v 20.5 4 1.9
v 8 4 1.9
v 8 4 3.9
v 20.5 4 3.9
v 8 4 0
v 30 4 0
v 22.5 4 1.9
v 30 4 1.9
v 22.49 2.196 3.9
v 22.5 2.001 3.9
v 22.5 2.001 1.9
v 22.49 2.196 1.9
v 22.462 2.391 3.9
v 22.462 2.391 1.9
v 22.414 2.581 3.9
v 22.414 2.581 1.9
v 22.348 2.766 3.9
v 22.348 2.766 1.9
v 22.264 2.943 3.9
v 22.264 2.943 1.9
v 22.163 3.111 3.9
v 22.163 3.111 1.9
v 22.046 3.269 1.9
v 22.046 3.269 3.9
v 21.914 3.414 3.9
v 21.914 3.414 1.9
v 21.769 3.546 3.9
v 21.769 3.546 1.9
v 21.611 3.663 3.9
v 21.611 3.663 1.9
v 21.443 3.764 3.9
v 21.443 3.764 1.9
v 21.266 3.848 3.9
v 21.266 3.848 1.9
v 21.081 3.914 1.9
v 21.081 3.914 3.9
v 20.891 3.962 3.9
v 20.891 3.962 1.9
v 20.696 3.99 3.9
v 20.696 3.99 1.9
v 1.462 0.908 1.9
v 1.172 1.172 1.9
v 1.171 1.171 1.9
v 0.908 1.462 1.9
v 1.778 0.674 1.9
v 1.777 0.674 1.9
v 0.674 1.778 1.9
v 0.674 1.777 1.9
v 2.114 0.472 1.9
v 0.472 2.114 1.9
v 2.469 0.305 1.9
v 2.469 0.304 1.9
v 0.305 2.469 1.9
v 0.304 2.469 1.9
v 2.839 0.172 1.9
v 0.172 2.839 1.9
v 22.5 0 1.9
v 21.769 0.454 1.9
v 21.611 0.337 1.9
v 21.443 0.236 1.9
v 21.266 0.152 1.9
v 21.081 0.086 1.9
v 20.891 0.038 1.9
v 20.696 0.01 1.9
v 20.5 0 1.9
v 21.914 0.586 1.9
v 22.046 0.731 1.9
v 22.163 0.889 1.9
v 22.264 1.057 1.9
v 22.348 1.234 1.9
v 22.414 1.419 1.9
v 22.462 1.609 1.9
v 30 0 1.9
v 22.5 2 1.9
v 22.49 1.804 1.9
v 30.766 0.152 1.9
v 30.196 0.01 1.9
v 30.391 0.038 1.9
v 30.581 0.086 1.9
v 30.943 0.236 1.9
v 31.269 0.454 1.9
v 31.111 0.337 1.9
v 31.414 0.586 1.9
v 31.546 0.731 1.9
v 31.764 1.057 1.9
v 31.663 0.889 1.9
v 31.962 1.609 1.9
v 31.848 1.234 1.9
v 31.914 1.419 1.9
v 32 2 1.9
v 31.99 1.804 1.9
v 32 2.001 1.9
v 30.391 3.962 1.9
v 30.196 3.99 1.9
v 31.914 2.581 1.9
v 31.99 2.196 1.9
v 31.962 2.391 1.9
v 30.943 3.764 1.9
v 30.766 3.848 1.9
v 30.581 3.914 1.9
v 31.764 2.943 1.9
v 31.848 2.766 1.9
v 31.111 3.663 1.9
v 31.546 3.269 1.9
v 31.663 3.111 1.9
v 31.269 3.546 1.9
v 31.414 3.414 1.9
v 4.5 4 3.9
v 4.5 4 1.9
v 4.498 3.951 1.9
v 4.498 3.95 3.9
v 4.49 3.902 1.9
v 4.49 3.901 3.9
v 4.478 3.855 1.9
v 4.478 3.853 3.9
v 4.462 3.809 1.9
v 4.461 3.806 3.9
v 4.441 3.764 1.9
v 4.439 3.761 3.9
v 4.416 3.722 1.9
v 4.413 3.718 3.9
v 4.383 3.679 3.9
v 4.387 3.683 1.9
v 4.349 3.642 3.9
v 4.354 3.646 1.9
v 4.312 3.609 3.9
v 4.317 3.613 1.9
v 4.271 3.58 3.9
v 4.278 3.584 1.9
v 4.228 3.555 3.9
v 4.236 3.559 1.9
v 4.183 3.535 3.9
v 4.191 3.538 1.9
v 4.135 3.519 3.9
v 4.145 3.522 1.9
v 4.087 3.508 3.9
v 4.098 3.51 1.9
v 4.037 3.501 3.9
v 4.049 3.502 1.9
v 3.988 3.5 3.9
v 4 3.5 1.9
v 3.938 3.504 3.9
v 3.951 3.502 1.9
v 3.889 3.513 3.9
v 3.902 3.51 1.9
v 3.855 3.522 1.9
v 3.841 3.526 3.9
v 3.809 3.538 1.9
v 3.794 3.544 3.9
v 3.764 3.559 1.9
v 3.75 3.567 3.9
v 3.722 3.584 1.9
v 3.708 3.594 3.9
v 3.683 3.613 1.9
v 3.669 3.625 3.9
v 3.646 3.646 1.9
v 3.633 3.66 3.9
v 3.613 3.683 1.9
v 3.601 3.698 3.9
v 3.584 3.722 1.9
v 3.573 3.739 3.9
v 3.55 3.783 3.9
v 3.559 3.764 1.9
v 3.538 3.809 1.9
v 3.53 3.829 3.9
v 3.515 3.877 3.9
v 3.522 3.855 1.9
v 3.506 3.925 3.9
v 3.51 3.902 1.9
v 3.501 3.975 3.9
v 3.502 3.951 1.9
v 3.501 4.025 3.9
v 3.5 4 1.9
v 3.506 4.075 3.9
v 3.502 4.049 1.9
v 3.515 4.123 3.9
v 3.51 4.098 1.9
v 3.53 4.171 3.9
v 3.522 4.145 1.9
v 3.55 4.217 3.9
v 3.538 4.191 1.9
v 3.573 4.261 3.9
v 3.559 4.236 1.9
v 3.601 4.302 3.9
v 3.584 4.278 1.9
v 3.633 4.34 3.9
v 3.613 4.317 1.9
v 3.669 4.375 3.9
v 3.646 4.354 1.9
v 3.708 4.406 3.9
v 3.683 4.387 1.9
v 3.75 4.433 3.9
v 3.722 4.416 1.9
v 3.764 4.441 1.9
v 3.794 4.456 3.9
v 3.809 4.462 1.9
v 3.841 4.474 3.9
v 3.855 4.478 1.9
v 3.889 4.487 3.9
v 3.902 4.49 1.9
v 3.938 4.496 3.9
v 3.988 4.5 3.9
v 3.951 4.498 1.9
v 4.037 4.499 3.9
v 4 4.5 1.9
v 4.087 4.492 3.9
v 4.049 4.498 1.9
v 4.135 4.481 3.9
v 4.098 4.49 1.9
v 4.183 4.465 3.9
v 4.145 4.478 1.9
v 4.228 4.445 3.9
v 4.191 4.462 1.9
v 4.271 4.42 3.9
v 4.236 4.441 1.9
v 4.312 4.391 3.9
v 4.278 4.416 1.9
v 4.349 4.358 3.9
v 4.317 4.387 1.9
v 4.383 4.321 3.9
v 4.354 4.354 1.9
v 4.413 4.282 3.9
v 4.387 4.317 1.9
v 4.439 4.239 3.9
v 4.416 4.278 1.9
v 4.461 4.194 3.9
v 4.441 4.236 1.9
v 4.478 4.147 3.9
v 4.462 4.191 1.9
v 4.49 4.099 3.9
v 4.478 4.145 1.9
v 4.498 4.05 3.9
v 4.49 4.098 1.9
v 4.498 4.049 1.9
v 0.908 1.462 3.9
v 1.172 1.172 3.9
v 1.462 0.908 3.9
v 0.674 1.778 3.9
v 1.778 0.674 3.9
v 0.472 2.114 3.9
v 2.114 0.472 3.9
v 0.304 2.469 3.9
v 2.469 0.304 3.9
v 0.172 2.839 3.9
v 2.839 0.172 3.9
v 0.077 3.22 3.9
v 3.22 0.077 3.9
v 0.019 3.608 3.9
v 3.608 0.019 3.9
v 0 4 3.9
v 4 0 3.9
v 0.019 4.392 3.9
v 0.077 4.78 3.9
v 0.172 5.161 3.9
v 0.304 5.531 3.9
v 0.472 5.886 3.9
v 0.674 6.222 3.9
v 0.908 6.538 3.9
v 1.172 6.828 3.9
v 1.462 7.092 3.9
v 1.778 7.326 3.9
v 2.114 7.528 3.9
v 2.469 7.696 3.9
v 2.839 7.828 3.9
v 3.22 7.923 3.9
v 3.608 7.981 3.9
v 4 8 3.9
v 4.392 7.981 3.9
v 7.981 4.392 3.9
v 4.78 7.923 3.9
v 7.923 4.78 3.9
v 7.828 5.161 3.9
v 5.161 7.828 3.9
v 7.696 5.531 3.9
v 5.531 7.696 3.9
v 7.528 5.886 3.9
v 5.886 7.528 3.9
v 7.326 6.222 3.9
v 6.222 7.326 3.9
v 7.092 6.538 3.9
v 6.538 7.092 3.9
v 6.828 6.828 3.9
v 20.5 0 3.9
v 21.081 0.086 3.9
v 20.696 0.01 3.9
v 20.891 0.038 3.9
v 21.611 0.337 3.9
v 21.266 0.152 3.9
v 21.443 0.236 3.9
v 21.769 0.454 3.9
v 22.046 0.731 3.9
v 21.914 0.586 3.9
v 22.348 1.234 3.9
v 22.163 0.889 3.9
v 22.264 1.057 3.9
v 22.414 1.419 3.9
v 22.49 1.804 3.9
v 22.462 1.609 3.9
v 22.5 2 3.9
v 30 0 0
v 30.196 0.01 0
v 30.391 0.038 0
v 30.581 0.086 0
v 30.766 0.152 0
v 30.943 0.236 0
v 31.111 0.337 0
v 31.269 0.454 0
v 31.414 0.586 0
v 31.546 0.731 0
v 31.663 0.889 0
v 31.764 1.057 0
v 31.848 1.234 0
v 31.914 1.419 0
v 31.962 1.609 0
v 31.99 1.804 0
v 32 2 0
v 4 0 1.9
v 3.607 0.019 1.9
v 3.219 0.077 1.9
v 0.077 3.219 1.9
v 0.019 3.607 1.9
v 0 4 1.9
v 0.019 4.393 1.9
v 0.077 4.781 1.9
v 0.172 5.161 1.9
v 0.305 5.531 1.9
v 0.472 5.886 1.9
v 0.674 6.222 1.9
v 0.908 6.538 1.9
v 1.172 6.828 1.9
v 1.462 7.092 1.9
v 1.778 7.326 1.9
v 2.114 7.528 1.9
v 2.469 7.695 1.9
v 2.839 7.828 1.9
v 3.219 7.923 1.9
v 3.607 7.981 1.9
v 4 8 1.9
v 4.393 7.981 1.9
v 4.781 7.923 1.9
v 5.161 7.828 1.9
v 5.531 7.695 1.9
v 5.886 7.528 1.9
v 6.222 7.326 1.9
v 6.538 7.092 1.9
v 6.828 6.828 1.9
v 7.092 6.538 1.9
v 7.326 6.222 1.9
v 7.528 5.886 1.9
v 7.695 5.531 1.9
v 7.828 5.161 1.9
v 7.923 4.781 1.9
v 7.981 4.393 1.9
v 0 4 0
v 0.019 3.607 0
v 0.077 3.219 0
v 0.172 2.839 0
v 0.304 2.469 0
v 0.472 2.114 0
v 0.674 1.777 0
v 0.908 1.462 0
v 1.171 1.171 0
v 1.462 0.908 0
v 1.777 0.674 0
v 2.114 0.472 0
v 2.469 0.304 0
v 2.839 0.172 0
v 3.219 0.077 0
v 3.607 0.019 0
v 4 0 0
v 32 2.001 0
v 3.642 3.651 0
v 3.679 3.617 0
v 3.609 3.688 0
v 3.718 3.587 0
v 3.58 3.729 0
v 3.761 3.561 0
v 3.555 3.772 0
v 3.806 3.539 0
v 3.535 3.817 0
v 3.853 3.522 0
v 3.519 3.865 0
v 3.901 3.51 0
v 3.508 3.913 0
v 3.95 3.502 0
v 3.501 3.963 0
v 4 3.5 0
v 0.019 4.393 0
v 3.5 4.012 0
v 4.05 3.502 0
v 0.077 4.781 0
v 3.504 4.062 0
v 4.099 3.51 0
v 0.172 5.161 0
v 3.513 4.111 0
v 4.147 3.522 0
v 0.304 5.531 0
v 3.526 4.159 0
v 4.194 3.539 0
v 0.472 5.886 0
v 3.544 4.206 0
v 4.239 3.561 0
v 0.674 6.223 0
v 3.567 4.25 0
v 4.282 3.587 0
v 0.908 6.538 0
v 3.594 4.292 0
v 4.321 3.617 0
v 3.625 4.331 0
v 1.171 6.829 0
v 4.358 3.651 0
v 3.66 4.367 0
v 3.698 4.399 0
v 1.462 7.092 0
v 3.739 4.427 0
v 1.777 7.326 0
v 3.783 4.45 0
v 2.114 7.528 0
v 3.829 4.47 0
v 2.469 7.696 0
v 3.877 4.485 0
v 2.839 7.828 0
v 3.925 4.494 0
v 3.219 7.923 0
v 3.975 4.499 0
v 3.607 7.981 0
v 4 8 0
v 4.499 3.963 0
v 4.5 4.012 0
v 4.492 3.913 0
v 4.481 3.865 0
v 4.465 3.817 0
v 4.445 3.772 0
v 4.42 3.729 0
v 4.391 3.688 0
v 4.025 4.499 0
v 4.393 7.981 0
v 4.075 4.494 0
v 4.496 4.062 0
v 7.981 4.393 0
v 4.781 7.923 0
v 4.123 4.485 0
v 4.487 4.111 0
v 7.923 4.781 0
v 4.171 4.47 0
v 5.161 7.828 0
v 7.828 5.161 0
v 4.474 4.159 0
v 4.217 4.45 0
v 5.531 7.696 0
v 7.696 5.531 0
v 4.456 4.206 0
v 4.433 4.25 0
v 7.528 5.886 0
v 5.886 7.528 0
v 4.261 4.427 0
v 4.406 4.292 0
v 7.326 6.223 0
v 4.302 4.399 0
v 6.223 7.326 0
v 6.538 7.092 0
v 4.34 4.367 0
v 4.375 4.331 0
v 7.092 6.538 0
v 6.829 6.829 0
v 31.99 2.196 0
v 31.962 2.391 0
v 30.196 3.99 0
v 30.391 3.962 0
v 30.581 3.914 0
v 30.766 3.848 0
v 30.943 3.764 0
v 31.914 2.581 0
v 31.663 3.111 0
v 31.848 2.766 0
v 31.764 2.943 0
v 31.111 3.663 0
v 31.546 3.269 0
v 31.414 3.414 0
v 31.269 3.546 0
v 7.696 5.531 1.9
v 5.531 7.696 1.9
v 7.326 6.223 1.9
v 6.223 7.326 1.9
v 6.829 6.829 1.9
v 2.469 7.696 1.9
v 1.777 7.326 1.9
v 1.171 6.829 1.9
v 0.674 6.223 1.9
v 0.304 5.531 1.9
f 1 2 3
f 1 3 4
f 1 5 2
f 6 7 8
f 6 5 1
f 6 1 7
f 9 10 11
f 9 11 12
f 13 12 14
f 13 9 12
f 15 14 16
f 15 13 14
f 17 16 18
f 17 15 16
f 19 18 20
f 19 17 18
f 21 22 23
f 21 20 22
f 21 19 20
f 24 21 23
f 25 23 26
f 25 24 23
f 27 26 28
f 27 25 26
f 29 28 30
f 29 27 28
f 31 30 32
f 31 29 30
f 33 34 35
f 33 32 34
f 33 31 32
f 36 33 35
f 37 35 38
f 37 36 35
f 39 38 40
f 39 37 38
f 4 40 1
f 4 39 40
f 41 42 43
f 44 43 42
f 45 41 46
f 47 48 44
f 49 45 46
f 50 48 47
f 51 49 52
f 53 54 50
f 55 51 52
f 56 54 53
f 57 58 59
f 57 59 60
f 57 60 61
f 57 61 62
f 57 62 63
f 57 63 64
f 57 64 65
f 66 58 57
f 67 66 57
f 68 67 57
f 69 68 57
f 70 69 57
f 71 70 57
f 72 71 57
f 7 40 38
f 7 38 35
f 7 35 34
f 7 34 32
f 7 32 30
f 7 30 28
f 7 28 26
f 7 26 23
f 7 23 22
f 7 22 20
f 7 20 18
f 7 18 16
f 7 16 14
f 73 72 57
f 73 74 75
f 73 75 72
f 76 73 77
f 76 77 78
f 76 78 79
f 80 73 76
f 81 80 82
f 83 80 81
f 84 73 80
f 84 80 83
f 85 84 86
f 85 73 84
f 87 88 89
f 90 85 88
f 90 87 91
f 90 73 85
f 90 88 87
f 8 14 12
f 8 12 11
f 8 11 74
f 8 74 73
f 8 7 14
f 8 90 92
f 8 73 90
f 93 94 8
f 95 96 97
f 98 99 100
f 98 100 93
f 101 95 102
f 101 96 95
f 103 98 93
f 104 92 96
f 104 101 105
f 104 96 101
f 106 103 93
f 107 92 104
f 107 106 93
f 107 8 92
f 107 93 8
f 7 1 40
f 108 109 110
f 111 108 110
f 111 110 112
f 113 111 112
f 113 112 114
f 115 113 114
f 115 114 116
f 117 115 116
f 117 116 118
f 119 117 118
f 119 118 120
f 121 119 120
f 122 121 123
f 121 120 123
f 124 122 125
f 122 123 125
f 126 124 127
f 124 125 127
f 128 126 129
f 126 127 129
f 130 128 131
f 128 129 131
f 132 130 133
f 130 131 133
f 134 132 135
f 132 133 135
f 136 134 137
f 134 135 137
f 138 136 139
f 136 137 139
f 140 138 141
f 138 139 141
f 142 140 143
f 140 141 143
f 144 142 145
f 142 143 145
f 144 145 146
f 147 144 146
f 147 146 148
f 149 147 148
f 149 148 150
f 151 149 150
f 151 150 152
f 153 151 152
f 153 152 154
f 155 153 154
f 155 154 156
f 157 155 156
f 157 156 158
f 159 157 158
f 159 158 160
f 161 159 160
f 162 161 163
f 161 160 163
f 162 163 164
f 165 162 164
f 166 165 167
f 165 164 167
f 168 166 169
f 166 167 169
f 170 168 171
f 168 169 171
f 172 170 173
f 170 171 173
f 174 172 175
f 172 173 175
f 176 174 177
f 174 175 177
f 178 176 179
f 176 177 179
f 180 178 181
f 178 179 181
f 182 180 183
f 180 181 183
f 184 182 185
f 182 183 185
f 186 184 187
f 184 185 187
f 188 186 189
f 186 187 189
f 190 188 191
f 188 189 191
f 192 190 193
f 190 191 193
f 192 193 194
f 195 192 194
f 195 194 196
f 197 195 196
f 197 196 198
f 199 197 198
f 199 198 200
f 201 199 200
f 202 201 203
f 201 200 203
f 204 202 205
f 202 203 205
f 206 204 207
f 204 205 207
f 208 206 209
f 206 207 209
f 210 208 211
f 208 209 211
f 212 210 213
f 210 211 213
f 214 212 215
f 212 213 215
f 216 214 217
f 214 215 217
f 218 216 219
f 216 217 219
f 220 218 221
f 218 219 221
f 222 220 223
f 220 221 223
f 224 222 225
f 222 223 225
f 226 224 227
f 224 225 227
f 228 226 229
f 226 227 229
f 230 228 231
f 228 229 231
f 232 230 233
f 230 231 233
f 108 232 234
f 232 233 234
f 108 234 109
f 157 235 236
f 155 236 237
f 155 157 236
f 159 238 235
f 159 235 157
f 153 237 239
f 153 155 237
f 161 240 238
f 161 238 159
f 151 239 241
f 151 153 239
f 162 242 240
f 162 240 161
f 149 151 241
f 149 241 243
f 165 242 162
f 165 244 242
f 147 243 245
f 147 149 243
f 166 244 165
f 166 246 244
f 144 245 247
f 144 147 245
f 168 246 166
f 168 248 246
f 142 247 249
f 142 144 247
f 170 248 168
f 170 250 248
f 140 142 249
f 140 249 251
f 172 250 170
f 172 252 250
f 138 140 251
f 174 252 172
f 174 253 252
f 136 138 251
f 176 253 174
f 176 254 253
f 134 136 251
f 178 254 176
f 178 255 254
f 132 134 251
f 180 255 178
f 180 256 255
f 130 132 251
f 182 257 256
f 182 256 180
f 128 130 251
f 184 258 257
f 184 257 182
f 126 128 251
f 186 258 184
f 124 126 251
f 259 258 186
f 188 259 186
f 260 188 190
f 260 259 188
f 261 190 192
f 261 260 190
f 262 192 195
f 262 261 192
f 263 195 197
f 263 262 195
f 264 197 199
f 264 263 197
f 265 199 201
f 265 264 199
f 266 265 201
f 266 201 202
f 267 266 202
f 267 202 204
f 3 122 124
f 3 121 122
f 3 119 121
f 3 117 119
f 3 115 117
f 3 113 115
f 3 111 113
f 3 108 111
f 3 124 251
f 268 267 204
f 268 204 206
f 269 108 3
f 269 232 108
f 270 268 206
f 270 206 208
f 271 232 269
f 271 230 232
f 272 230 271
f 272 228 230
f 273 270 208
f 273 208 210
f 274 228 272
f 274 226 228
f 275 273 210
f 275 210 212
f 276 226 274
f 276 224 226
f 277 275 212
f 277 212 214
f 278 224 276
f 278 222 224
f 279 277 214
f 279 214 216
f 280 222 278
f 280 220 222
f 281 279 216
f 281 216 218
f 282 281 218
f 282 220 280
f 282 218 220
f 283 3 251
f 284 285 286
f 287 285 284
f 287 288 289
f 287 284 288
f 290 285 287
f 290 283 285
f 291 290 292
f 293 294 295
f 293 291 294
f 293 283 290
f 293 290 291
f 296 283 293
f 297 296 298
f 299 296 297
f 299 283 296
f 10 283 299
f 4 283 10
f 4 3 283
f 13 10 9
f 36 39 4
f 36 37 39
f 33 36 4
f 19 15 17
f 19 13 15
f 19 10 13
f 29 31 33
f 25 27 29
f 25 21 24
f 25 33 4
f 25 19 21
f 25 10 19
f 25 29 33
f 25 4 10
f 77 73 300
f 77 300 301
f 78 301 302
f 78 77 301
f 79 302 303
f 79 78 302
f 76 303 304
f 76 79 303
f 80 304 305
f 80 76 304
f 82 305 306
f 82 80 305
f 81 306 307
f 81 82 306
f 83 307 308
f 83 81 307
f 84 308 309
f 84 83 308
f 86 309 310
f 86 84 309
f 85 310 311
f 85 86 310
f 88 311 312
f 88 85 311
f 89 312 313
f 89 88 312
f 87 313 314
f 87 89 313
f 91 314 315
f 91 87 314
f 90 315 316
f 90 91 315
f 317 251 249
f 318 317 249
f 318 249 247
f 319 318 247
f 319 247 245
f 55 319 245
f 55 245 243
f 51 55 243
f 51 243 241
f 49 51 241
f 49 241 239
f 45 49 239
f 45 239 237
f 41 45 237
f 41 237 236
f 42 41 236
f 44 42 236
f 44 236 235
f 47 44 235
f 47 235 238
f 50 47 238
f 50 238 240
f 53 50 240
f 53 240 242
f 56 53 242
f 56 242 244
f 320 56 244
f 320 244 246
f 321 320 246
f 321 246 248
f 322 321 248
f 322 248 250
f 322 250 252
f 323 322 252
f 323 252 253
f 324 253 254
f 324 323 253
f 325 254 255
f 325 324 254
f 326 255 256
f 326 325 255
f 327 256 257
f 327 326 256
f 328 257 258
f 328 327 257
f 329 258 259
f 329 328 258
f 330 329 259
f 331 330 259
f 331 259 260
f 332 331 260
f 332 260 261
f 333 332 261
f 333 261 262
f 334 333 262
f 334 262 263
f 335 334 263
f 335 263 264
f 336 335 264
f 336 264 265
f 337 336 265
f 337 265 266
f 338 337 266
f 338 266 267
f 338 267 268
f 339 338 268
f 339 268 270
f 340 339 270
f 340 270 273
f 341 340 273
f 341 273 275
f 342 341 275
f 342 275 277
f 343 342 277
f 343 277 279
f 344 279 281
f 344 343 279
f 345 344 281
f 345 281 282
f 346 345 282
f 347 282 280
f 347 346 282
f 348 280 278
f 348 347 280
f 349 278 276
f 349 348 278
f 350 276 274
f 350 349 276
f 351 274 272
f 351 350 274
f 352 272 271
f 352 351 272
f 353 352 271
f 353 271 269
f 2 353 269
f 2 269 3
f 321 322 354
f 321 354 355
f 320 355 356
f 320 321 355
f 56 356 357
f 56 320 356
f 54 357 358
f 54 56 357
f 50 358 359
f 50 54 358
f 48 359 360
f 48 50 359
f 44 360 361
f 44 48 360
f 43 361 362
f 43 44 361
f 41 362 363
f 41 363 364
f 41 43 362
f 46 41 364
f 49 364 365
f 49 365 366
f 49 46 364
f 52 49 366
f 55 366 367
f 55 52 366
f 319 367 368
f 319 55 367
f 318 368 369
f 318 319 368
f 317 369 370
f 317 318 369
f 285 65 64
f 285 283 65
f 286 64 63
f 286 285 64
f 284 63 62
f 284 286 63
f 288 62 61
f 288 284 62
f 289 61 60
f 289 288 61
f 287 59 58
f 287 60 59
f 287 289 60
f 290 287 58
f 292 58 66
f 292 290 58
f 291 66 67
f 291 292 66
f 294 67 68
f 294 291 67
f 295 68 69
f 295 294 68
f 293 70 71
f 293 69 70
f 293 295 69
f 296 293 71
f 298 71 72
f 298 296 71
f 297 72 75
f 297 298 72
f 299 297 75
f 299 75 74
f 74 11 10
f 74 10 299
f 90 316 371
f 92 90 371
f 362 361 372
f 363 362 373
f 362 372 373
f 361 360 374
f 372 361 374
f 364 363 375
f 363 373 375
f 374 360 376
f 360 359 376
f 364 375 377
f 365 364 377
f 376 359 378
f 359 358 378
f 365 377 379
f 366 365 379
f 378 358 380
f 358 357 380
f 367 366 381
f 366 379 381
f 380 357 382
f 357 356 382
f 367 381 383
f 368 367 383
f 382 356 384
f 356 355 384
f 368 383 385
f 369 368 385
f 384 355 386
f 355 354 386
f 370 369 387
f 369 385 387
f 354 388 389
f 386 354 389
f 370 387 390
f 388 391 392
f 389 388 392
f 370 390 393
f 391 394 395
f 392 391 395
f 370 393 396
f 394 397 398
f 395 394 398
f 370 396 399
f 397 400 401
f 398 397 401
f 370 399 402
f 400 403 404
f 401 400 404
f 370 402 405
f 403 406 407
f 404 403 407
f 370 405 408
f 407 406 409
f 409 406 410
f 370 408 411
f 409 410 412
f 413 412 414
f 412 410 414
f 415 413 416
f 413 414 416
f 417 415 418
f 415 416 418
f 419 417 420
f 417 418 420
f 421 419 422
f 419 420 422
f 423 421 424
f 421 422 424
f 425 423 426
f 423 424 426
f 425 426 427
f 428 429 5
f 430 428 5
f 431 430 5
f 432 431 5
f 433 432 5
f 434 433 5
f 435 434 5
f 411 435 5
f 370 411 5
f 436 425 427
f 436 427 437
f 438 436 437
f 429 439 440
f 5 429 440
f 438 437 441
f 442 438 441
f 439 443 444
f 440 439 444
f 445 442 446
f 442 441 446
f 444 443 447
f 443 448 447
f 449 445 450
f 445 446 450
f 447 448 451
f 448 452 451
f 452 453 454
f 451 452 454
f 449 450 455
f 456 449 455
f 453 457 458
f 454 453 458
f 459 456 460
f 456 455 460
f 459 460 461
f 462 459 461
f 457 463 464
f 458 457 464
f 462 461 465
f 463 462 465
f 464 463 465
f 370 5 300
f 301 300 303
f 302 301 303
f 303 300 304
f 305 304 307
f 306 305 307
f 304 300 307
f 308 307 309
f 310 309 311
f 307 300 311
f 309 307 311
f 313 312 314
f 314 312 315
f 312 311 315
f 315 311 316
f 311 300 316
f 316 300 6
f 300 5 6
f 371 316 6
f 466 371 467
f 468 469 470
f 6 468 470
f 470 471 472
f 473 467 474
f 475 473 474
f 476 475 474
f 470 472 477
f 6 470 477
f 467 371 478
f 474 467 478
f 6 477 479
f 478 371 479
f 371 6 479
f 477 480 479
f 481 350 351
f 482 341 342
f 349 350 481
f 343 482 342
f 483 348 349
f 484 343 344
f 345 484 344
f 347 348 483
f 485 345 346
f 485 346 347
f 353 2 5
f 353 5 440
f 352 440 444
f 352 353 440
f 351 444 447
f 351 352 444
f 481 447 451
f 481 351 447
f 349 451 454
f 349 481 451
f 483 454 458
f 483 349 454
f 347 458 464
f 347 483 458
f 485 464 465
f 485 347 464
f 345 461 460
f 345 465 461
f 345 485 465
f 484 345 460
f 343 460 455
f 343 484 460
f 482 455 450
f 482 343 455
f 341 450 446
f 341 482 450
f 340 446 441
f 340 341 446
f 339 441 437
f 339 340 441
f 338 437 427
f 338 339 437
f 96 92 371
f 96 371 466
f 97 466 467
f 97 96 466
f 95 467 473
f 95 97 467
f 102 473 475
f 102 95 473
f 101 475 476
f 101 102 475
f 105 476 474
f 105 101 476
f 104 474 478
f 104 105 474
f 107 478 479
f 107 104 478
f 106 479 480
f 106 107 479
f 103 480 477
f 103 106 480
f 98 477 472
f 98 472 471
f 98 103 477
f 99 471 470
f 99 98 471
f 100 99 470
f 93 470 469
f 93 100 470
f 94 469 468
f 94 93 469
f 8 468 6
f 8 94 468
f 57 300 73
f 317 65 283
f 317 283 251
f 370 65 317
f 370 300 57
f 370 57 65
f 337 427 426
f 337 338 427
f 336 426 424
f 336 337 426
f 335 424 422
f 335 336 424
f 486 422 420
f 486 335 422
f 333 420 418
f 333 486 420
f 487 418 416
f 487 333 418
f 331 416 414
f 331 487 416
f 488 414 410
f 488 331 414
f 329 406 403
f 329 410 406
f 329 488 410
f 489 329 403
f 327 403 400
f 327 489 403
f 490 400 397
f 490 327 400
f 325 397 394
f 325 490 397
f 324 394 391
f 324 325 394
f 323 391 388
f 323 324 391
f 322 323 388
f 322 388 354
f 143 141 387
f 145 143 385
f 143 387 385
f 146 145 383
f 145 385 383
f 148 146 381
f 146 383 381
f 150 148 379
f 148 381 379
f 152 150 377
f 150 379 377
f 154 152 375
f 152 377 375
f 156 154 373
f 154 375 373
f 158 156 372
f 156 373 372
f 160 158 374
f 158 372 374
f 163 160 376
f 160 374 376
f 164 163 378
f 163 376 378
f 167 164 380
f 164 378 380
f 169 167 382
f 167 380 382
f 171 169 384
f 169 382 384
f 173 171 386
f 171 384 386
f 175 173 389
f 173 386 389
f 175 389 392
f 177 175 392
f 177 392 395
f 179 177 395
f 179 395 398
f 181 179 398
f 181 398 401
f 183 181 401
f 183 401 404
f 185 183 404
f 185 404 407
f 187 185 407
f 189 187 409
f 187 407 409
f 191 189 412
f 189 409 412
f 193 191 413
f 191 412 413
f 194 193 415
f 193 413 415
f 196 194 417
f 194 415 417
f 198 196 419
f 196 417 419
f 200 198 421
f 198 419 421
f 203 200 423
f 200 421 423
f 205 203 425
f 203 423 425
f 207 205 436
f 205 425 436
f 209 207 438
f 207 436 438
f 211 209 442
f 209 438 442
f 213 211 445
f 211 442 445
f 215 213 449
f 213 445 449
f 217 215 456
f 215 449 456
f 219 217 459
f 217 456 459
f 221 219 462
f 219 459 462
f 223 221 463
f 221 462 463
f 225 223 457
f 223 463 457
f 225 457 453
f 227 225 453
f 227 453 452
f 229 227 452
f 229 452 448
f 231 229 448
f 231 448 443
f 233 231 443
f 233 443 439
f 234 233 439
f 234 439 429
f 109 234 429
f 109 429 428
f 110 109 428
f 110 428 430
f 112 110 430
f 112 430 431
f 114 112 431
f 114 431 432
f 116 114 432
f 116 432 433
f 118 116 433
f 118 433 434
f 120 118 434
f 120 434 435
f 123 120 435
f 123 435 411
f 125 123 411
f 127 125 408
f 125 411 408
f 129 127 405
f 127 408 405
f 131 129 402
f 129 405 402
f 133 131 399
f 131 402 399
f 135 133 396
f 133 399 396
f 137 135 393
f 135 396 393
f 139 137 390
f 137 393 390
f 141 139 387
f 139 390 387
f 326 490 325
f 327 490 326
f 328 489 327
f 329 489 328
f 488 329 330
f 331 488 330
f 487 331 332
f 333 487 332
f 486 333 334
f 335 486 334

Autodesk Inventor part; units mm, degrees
ref_plane "YZ Plane" through (0, 0, 0) normal (1, 0, 0) x (0, 1, 0)
ref_plane "XZ Plane" through (0, 0, 0) normal (0, 1, 0) x (-1, 0, 0)
ref_plane "XY Plane" through (0, 0, 0) normal (0, 0, 1) x (1, 0, 0)
sketch "Boceto1" plane through (0, 0, 0) normal (0, 0, 1) x (1, 0, 0)
  line L0 (0, 0) -> (8, 0)
  line L1 (8, 0) -> (8, 8)
  line L2 (8, 8) -> (0, 8)
  line L3 (0, 8) -> (0, 0)
  line L4 (8, 0) -> (32, 0)
  line L5 (32, 0) -> (32, 4)
  line L6 (32, 4) -> (8, 4)
  line L7 (8, 4) -> (8, 0)
  dimension "d0" = 8
  dimension "d2" = 24
  dimension "d3" = 4
  dimension "d23" = 8
extrude "Extrusión1" add sketch "Boceto1" along normal blind 1.9
fillet "Empalme5" radius 4 3 edges at (0, 0, 0.95) (0, 8, 0.95) (8, 8, 0.95)
fillet "Empalme6" radius 2 2 edges at (32, 4, 0.95) (32, 0, 0.95)
sketch "Boceto2" plane through (0, 0, 1.9) normal (0, 0, 1) x (1, 0, 0)
  arc A0 (8, 4) -> (4, 0) centre (4, 4) ccw projected
  point P0 (0, 0)
hole "Hole1" at (4, 4, 1.9) direction (0, 0, -1) diameter 1 end through all
sketch "Boceto3" plane through (0, 0, 1.9) normal (0, 0, 1) x (1, 0, 0)
  circle A0 centre (4, 4) radius 0.5 projected
  line L0 (8, 4) -> (30, 4) projected
  arc A1 (8, 4) -> (4, 0) centre (4, 4) ccw projected
  line L1 (30, 0) -> (4, 0) projected
  line L2 (22.5, 4) -> (22.5, 0)
  point P0 (0, 0)
  dimension "d19" = 14.5
extrude "Extrusión2" add sketch "Boceto3" along normal blind 2
fillet "Empalme7" radius 2 2 edges at (22.5, 0, 2.9) (22.5, 4, 2.9)
properties part number "Traba"
